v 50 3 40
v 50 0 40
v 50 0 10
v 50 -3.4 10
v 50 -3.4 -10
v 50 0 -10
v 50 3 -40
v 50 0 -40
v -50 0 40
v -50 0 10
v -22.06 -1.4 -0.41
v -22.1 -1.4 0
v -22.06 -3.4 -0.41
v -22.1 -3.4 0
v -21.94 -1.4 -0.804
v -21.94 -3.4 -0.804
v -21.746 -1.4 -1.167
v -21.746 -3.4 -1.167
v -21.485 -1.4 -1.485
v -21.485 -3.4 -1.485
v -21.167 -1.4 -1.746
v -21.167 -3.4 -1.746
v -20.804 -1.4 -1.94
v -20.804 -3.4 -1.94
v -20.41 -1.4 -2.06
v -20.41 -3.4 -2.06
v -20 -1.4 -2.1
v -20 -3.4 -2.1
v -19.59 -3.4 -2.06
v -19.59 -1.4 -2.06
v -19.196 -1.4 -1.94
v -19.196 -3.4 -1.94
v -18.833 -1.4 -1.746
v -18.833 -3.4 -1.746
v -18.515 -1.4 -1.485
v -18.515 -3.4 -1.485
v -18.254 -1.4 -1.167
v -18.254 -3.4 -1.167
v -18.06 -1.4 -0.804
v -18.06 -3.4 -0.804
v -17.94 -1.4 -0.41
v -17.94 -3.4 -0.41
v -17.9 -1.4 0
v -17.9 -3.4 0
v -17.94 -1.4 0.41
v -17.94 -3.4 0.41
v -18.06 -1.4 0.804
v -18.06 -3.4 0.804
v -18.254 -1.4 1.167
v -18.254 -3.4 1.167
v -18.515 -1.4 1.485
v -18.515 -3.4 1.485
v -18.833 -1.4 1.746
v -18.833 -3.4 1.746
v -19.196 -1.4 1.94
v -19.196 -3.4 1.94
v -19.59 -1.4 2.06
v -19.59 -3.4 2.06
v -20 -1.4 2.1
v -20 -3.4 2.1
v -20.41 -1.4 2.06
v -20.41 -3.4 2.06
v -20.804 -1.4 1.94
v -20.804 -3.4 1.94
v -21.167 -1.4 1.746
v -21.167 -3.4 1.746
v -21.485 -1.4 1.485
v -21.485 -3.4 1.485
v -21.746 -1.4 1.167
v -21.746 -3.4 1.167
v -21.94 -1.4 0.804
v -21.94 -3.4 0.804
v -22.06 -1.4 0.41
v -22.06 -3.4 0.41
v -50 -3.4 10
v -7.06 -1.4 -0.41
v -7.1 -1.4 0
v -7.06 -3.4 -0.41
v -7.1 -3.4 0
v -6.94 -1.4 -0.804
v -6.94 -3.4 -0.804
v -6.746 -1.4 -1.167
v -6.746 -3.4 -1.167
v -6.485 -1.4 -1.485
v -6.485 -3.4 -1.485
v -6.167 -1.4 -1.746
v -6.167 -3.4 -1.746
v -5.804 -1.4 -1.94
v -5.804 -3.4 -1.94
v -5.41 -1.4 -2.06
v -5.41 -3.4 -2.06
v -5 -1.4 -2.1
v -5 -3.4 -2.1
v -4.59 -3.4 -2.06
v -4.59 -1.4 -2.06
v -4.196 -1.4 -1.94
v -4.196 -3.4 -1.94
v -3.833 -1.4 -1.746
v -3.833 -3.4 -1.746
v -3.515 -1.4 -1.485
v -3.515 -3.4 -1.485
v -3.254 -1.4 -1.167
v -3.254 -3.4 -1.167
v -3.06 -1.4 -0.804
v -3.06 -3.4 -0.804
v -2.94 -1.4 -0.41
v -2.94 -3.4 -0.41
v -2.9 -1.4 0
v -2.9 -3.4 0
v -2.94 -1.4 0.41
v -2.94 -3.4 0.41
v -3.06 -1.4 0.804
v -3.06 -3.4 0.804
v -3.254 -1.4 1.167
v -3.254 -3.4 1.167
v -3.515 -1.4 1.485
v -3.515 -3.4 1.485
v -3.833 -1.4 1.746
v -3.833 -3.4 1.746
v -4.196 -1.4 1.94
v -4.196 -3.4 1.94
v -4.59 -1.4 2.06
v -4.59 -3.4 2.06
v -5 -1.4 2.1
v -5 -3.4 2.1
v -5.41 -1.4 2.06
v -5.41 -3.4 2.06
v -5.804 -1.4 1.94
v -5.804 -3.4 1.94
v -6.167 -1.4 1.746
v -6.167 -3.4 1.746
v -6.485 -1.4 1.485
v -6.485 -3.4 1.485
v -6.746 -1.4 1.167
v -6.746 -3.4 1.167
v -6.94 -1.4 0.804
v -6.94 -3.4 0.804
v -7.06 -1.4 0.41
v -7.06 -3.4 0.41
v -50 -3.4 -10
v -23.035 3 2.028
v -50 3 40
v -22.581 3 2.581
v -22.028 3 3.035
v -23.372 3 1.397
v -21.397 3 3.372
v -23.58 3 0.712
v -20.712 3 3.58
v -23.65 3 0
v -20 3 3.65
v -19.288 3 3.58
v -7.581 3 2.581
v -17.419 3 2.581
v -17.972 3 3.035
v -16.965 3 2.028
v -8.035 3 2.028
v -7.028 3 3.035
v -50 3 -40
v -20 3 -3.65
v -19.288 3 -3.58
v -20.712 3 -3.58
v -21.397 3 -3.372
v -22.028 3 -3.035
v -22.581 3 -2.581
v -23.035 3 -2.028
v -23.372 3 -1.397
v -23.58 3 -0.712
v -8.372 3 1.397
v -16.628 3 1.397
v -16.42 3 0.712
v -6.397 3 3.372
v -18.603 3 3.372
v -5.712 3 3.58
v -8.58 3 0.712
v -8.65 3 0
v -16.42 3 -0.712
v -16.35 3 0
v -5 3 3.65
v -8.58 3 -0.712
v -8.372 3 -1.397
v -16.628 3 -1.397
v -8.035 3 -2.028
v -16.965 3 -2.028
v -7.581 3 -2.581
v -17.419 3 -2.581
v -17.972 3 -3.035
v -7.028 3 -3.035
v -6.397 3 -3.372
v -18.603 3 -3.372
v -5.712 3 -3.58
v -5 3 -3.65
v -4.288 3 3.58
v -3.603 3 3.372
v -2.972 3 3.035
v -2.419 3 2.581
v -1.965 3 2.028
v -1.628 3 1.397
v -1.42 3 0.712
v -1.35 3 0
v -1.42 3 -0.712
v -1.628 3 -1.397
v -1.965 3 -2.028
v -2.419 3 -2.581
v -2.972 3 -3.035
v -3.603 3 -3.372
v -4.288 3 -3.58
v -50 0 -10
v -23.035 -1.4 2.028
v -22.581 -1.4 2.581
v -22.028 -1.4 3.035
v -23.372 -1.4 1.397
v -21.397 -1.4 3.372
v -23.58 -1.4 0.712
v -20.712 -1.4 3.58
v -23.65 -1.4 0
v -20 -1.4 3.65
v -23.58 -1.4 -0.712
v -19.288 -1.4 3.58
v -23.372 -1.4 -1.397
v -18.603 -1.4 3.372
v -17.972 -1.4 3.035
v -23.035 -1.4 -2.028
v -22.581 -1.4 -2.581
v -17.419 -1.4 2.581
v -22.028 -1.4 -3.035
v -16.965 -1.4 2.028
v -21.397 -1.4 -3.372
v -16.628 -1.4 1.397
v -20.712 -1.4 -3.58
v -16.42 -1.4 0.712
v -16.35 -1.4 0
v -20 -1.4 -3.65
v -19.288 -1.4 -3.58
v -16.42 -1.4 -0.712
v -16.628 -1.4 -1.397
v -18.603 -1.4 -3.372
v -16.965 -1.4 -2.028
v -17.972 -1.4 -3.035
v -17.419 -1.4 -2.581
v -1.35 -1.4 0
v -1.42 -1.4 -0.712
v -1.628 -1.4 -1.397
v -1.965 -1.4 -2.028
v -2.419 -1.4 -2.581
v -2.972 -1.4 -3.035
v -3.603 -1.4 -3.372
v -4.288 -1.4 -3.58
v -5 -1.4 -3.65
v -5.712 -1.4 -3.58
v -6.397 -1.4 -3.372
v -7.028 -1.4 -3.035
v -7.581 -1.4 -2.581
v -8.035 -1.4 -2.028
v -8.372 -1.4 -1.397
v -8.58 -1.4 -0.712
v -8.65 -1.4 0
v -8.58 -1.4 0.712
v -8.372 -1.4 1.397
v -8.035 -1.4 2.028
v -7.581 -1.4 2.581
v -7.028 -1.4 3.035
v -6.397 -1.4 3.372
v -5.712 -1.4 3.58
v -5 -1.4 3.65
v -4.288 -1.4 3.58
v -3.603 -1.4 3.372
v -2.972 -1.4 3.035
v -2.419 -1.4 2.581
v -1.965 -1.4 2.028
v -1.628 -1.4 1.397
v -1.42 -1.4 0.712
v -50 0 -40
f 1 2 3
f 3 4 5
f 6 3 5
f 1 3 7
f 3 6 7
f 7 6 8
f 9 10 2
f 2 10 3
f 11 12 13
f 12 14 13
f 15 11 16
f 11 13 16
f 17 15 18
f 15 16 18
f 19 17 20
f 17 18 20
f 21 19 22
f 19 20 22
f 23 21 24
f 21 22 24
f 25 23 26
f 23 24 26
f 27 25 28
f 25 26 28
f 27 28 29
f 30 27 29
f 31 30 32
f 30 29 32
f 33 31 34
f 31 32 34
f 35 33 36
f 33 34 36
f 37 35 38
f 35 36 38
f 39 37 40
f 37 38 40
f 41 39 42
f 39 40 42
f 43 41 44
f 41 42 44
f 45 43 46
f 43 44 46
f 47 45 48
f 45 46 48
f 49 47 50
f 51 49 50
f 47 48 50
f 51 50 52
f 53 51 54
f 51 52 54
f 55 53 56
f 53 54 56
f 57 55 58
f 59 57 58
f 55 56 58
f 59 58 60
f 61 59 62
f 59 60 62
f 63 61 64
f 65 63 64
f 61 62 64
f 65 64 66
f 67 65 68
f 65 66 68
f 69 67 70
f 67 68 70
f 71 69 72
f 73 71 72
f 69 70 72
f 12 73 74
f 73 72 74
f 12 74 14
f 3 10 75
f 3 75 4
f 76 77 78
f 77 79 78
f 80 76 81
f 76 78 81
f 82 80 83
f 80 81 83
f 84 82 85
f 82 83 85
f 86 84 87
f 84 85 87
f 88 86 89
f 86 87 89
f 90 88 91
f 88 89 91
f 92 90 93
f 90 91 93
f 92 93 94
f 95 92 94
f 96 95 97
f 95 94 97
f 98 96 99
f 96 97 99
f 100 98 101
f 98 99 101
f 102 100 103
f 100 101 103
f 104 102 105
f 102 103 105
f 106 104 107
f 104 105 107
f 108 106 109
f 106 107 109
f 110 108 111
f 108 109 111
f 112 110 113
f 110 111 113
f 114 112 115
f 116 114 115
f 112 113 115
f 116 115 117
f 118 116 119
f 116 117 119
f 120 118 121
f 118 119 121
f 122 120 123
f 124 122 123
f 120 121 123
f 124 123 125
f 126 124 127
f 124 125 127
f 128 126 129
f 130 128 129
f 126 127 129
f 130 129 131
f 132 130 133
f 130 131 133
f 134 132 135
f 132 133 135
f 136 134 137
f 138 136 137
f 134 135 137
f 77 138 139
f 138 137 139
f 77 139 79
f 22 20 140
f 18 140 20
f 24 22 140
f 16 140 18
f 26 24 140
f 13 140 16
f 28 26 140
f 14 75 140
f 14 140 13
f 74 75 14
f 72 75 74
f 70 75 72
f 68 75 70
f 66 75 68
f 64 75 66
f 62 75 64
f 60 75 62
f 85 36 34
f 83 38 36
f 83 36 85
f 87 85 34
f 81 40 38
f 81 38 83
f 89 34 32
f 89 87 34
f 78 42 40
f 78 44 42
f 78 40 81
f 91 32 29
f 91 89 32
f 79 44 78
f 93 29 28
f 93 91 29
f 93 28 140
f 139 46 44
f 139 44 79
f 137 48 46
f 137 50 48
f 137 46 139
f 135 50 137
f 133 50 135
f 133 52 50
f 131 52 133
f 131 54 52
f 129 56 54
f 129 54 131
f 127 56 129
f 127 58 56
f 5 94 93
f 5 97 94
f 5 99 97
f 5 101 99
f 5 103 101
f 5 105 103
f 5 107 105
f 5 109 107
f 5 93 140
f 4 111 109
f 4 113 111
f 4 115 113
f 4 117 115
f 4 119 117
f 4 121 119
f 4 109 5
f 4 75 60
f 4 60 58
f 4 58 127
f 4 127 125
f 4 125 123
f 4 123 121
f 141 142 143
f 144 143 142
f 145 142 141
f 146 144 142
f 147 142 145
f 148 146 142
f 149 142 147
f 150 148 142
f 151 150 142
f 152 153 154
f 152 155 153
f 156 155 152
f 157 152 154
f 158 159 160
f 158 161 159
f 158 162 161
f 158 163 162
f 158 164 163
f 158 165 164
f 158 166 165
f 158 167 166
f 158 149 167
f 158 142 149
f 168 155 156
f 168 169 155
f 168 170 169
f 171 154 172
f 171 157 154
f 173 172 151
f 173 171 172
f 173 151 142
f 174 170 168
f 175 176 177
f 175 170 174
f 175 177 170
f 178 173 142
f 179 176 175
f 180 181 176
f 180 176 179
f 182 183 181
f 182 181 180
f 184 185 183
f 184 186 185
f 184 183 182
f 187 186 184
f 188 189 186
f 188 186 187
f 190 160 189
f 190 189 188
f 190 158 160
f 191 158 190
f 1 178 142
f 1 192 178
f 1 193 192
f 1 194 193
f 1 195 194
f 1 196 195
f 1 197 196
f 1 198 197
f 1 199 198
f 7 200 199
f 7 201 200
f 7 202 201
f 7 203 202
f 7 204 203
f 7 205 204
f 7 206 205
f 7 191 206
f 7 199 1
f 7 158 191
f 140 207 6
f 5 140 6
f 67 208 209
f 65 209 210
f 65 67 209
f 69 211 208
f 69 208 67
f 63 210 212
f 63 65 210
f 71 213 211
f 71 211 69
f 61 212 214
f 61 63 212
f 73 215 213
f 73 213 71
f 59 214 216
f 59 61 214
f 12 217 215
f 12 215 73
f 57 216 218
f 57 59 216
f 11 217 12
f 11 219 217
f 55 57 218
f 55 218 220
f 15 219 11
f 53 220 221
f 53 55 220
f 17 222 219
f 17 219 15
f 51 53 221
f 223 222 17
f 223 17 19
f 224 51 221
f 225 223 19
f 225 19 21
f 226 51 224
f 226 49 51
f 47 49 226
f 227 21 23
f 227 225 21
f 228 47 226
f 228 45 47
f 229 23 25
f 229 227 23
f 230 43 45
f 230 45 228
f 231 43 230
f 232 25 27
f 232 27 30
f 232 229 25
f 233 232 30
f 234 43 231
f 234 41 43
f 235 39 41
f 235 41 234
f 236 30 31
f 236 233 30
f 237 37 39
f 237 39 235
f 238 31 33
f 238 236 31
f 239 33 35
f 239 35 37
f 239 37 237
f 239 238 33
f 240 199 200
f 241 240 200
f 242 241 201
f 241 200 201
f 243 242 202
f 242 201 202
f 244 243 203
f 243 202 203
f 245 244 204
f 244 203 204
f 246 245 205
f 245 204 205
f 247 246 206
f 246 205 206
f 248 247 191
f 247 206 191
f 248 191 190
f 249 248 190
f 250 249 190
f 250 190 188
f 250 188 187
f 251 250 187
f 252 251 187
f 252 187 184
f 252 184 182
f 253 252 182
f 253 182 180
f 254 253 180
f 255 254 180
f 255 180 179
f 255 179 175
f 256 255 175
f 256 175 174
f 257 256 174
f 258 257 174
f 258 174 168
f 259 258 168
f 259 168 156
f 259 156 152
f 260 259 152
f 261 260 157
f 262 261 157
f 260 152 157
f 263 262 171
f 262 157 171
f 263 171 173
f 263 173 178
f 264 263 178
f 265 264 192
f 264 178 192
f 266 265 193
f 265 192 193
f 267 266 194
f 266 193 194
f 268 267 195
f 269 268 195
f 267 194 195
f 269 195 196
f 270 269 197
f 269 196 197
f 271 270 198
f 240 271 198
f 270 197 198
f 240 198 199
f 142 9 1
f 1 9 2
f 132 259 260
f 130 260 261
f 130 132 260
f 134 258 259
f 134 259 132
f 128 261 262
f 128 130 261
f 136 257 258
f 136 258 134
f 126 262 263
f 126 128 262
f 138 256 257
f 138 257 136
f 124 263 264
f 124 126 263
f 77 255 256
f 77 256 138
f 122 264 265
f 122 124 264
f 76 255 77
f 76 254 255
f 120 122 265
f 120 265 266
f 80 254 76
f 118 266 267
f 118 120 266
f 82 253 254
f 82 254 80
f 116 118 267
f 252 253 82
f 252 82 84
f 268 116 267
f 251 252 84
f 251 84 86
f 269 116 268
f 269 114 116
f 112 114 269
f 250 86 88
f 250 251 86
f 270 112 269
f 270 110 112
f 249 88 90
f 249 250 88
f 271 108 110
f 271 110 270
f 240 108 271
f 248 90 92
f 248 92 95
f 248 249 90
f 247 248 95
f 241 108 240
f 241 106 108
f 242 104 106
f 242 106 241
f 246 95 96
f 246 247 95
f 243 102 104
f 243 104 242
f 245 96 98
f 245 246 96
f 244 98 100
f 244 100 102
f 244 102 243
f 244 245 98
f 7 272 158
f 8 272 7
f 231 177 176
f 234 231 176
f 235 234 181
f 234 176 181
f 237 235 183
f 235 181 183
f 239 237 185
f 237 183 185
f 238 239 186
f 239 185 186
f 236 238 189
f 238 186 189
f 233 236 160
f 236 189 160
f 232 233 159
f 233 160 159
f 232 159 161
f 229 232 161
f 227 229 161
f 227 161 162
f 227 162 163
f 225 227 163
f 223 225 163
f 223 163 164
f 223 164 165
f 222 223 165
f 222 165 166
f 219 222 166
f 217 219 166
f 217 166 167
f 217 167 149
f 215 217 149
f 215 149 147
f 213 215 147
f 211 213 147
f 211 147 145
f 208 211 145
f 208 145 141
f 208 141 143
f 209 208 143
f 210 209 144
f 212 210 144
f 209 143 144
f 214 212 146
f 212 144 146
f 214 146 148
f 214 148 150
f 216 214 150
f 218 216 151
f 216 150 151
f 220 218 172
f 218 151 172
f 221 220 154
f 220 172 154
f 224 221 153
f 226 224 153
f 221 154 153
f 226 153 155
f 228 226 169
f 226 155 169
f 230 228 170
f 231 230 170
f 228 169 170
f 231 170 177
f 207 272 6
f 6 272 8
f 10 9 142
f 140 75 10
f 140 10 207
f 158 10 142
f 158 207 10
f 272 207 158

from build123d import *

# Parameters (mm, degrees)
SKETCH_1_W                   = 100
SKETCH_1_H                   = 80
EXTRUDE_1_DEPTH              = 3
SKETCH_2_W                   = 100
SKETCH_2_H                   = 20
EXTRUDE_2_DEPTH              = 3.4
HOLE_WIZARD_M4_1_D           = 4.2
HOLE_WIZARD_M4_1_CBORE_D     = 7.3
HOLE_WIZARD_M4_1_CBORE_DEPTH = 4.4


with BuildPart() as part:
    # 草圖1 → 填料-伸長1 (new body)
    with BuildSketch(Plane(origin=(0, 0, 0), x_dir=(1, 0, 0), z_dir=(0, 1, 0))):
        Rectangle(SKETCH_1_W, SKETCH_1_H)
    extrude(amount=EXTRUDE_1_DEPTH)

    # 草圖2 → 填料-伸長2 (add)
    with BuildSketch(Plane.XZ):
        Rectangle(SKETCH_2_W, SKETCH_2_H)
    extrude(amount=EXTRUDE_2_DEPTH)

    # M4 六角承窩頭蓋螺釘的柱孔1 (through all)
    with Locations(Plane(origin=(0, 3, 0), x_dir=(1, 0, 0), z_dir=(0, 1, 0))):
        with Locations((-20, 0), (-5, 0)):
            CounterBoreHole(HOLE_WIZARD_M4_1_D / 2, HOLE_WIZARD_M4_1_CBORE_D / 2, HOLE_WIZARD_M4_1_CBORE_DEPTH)


solid = part.part
